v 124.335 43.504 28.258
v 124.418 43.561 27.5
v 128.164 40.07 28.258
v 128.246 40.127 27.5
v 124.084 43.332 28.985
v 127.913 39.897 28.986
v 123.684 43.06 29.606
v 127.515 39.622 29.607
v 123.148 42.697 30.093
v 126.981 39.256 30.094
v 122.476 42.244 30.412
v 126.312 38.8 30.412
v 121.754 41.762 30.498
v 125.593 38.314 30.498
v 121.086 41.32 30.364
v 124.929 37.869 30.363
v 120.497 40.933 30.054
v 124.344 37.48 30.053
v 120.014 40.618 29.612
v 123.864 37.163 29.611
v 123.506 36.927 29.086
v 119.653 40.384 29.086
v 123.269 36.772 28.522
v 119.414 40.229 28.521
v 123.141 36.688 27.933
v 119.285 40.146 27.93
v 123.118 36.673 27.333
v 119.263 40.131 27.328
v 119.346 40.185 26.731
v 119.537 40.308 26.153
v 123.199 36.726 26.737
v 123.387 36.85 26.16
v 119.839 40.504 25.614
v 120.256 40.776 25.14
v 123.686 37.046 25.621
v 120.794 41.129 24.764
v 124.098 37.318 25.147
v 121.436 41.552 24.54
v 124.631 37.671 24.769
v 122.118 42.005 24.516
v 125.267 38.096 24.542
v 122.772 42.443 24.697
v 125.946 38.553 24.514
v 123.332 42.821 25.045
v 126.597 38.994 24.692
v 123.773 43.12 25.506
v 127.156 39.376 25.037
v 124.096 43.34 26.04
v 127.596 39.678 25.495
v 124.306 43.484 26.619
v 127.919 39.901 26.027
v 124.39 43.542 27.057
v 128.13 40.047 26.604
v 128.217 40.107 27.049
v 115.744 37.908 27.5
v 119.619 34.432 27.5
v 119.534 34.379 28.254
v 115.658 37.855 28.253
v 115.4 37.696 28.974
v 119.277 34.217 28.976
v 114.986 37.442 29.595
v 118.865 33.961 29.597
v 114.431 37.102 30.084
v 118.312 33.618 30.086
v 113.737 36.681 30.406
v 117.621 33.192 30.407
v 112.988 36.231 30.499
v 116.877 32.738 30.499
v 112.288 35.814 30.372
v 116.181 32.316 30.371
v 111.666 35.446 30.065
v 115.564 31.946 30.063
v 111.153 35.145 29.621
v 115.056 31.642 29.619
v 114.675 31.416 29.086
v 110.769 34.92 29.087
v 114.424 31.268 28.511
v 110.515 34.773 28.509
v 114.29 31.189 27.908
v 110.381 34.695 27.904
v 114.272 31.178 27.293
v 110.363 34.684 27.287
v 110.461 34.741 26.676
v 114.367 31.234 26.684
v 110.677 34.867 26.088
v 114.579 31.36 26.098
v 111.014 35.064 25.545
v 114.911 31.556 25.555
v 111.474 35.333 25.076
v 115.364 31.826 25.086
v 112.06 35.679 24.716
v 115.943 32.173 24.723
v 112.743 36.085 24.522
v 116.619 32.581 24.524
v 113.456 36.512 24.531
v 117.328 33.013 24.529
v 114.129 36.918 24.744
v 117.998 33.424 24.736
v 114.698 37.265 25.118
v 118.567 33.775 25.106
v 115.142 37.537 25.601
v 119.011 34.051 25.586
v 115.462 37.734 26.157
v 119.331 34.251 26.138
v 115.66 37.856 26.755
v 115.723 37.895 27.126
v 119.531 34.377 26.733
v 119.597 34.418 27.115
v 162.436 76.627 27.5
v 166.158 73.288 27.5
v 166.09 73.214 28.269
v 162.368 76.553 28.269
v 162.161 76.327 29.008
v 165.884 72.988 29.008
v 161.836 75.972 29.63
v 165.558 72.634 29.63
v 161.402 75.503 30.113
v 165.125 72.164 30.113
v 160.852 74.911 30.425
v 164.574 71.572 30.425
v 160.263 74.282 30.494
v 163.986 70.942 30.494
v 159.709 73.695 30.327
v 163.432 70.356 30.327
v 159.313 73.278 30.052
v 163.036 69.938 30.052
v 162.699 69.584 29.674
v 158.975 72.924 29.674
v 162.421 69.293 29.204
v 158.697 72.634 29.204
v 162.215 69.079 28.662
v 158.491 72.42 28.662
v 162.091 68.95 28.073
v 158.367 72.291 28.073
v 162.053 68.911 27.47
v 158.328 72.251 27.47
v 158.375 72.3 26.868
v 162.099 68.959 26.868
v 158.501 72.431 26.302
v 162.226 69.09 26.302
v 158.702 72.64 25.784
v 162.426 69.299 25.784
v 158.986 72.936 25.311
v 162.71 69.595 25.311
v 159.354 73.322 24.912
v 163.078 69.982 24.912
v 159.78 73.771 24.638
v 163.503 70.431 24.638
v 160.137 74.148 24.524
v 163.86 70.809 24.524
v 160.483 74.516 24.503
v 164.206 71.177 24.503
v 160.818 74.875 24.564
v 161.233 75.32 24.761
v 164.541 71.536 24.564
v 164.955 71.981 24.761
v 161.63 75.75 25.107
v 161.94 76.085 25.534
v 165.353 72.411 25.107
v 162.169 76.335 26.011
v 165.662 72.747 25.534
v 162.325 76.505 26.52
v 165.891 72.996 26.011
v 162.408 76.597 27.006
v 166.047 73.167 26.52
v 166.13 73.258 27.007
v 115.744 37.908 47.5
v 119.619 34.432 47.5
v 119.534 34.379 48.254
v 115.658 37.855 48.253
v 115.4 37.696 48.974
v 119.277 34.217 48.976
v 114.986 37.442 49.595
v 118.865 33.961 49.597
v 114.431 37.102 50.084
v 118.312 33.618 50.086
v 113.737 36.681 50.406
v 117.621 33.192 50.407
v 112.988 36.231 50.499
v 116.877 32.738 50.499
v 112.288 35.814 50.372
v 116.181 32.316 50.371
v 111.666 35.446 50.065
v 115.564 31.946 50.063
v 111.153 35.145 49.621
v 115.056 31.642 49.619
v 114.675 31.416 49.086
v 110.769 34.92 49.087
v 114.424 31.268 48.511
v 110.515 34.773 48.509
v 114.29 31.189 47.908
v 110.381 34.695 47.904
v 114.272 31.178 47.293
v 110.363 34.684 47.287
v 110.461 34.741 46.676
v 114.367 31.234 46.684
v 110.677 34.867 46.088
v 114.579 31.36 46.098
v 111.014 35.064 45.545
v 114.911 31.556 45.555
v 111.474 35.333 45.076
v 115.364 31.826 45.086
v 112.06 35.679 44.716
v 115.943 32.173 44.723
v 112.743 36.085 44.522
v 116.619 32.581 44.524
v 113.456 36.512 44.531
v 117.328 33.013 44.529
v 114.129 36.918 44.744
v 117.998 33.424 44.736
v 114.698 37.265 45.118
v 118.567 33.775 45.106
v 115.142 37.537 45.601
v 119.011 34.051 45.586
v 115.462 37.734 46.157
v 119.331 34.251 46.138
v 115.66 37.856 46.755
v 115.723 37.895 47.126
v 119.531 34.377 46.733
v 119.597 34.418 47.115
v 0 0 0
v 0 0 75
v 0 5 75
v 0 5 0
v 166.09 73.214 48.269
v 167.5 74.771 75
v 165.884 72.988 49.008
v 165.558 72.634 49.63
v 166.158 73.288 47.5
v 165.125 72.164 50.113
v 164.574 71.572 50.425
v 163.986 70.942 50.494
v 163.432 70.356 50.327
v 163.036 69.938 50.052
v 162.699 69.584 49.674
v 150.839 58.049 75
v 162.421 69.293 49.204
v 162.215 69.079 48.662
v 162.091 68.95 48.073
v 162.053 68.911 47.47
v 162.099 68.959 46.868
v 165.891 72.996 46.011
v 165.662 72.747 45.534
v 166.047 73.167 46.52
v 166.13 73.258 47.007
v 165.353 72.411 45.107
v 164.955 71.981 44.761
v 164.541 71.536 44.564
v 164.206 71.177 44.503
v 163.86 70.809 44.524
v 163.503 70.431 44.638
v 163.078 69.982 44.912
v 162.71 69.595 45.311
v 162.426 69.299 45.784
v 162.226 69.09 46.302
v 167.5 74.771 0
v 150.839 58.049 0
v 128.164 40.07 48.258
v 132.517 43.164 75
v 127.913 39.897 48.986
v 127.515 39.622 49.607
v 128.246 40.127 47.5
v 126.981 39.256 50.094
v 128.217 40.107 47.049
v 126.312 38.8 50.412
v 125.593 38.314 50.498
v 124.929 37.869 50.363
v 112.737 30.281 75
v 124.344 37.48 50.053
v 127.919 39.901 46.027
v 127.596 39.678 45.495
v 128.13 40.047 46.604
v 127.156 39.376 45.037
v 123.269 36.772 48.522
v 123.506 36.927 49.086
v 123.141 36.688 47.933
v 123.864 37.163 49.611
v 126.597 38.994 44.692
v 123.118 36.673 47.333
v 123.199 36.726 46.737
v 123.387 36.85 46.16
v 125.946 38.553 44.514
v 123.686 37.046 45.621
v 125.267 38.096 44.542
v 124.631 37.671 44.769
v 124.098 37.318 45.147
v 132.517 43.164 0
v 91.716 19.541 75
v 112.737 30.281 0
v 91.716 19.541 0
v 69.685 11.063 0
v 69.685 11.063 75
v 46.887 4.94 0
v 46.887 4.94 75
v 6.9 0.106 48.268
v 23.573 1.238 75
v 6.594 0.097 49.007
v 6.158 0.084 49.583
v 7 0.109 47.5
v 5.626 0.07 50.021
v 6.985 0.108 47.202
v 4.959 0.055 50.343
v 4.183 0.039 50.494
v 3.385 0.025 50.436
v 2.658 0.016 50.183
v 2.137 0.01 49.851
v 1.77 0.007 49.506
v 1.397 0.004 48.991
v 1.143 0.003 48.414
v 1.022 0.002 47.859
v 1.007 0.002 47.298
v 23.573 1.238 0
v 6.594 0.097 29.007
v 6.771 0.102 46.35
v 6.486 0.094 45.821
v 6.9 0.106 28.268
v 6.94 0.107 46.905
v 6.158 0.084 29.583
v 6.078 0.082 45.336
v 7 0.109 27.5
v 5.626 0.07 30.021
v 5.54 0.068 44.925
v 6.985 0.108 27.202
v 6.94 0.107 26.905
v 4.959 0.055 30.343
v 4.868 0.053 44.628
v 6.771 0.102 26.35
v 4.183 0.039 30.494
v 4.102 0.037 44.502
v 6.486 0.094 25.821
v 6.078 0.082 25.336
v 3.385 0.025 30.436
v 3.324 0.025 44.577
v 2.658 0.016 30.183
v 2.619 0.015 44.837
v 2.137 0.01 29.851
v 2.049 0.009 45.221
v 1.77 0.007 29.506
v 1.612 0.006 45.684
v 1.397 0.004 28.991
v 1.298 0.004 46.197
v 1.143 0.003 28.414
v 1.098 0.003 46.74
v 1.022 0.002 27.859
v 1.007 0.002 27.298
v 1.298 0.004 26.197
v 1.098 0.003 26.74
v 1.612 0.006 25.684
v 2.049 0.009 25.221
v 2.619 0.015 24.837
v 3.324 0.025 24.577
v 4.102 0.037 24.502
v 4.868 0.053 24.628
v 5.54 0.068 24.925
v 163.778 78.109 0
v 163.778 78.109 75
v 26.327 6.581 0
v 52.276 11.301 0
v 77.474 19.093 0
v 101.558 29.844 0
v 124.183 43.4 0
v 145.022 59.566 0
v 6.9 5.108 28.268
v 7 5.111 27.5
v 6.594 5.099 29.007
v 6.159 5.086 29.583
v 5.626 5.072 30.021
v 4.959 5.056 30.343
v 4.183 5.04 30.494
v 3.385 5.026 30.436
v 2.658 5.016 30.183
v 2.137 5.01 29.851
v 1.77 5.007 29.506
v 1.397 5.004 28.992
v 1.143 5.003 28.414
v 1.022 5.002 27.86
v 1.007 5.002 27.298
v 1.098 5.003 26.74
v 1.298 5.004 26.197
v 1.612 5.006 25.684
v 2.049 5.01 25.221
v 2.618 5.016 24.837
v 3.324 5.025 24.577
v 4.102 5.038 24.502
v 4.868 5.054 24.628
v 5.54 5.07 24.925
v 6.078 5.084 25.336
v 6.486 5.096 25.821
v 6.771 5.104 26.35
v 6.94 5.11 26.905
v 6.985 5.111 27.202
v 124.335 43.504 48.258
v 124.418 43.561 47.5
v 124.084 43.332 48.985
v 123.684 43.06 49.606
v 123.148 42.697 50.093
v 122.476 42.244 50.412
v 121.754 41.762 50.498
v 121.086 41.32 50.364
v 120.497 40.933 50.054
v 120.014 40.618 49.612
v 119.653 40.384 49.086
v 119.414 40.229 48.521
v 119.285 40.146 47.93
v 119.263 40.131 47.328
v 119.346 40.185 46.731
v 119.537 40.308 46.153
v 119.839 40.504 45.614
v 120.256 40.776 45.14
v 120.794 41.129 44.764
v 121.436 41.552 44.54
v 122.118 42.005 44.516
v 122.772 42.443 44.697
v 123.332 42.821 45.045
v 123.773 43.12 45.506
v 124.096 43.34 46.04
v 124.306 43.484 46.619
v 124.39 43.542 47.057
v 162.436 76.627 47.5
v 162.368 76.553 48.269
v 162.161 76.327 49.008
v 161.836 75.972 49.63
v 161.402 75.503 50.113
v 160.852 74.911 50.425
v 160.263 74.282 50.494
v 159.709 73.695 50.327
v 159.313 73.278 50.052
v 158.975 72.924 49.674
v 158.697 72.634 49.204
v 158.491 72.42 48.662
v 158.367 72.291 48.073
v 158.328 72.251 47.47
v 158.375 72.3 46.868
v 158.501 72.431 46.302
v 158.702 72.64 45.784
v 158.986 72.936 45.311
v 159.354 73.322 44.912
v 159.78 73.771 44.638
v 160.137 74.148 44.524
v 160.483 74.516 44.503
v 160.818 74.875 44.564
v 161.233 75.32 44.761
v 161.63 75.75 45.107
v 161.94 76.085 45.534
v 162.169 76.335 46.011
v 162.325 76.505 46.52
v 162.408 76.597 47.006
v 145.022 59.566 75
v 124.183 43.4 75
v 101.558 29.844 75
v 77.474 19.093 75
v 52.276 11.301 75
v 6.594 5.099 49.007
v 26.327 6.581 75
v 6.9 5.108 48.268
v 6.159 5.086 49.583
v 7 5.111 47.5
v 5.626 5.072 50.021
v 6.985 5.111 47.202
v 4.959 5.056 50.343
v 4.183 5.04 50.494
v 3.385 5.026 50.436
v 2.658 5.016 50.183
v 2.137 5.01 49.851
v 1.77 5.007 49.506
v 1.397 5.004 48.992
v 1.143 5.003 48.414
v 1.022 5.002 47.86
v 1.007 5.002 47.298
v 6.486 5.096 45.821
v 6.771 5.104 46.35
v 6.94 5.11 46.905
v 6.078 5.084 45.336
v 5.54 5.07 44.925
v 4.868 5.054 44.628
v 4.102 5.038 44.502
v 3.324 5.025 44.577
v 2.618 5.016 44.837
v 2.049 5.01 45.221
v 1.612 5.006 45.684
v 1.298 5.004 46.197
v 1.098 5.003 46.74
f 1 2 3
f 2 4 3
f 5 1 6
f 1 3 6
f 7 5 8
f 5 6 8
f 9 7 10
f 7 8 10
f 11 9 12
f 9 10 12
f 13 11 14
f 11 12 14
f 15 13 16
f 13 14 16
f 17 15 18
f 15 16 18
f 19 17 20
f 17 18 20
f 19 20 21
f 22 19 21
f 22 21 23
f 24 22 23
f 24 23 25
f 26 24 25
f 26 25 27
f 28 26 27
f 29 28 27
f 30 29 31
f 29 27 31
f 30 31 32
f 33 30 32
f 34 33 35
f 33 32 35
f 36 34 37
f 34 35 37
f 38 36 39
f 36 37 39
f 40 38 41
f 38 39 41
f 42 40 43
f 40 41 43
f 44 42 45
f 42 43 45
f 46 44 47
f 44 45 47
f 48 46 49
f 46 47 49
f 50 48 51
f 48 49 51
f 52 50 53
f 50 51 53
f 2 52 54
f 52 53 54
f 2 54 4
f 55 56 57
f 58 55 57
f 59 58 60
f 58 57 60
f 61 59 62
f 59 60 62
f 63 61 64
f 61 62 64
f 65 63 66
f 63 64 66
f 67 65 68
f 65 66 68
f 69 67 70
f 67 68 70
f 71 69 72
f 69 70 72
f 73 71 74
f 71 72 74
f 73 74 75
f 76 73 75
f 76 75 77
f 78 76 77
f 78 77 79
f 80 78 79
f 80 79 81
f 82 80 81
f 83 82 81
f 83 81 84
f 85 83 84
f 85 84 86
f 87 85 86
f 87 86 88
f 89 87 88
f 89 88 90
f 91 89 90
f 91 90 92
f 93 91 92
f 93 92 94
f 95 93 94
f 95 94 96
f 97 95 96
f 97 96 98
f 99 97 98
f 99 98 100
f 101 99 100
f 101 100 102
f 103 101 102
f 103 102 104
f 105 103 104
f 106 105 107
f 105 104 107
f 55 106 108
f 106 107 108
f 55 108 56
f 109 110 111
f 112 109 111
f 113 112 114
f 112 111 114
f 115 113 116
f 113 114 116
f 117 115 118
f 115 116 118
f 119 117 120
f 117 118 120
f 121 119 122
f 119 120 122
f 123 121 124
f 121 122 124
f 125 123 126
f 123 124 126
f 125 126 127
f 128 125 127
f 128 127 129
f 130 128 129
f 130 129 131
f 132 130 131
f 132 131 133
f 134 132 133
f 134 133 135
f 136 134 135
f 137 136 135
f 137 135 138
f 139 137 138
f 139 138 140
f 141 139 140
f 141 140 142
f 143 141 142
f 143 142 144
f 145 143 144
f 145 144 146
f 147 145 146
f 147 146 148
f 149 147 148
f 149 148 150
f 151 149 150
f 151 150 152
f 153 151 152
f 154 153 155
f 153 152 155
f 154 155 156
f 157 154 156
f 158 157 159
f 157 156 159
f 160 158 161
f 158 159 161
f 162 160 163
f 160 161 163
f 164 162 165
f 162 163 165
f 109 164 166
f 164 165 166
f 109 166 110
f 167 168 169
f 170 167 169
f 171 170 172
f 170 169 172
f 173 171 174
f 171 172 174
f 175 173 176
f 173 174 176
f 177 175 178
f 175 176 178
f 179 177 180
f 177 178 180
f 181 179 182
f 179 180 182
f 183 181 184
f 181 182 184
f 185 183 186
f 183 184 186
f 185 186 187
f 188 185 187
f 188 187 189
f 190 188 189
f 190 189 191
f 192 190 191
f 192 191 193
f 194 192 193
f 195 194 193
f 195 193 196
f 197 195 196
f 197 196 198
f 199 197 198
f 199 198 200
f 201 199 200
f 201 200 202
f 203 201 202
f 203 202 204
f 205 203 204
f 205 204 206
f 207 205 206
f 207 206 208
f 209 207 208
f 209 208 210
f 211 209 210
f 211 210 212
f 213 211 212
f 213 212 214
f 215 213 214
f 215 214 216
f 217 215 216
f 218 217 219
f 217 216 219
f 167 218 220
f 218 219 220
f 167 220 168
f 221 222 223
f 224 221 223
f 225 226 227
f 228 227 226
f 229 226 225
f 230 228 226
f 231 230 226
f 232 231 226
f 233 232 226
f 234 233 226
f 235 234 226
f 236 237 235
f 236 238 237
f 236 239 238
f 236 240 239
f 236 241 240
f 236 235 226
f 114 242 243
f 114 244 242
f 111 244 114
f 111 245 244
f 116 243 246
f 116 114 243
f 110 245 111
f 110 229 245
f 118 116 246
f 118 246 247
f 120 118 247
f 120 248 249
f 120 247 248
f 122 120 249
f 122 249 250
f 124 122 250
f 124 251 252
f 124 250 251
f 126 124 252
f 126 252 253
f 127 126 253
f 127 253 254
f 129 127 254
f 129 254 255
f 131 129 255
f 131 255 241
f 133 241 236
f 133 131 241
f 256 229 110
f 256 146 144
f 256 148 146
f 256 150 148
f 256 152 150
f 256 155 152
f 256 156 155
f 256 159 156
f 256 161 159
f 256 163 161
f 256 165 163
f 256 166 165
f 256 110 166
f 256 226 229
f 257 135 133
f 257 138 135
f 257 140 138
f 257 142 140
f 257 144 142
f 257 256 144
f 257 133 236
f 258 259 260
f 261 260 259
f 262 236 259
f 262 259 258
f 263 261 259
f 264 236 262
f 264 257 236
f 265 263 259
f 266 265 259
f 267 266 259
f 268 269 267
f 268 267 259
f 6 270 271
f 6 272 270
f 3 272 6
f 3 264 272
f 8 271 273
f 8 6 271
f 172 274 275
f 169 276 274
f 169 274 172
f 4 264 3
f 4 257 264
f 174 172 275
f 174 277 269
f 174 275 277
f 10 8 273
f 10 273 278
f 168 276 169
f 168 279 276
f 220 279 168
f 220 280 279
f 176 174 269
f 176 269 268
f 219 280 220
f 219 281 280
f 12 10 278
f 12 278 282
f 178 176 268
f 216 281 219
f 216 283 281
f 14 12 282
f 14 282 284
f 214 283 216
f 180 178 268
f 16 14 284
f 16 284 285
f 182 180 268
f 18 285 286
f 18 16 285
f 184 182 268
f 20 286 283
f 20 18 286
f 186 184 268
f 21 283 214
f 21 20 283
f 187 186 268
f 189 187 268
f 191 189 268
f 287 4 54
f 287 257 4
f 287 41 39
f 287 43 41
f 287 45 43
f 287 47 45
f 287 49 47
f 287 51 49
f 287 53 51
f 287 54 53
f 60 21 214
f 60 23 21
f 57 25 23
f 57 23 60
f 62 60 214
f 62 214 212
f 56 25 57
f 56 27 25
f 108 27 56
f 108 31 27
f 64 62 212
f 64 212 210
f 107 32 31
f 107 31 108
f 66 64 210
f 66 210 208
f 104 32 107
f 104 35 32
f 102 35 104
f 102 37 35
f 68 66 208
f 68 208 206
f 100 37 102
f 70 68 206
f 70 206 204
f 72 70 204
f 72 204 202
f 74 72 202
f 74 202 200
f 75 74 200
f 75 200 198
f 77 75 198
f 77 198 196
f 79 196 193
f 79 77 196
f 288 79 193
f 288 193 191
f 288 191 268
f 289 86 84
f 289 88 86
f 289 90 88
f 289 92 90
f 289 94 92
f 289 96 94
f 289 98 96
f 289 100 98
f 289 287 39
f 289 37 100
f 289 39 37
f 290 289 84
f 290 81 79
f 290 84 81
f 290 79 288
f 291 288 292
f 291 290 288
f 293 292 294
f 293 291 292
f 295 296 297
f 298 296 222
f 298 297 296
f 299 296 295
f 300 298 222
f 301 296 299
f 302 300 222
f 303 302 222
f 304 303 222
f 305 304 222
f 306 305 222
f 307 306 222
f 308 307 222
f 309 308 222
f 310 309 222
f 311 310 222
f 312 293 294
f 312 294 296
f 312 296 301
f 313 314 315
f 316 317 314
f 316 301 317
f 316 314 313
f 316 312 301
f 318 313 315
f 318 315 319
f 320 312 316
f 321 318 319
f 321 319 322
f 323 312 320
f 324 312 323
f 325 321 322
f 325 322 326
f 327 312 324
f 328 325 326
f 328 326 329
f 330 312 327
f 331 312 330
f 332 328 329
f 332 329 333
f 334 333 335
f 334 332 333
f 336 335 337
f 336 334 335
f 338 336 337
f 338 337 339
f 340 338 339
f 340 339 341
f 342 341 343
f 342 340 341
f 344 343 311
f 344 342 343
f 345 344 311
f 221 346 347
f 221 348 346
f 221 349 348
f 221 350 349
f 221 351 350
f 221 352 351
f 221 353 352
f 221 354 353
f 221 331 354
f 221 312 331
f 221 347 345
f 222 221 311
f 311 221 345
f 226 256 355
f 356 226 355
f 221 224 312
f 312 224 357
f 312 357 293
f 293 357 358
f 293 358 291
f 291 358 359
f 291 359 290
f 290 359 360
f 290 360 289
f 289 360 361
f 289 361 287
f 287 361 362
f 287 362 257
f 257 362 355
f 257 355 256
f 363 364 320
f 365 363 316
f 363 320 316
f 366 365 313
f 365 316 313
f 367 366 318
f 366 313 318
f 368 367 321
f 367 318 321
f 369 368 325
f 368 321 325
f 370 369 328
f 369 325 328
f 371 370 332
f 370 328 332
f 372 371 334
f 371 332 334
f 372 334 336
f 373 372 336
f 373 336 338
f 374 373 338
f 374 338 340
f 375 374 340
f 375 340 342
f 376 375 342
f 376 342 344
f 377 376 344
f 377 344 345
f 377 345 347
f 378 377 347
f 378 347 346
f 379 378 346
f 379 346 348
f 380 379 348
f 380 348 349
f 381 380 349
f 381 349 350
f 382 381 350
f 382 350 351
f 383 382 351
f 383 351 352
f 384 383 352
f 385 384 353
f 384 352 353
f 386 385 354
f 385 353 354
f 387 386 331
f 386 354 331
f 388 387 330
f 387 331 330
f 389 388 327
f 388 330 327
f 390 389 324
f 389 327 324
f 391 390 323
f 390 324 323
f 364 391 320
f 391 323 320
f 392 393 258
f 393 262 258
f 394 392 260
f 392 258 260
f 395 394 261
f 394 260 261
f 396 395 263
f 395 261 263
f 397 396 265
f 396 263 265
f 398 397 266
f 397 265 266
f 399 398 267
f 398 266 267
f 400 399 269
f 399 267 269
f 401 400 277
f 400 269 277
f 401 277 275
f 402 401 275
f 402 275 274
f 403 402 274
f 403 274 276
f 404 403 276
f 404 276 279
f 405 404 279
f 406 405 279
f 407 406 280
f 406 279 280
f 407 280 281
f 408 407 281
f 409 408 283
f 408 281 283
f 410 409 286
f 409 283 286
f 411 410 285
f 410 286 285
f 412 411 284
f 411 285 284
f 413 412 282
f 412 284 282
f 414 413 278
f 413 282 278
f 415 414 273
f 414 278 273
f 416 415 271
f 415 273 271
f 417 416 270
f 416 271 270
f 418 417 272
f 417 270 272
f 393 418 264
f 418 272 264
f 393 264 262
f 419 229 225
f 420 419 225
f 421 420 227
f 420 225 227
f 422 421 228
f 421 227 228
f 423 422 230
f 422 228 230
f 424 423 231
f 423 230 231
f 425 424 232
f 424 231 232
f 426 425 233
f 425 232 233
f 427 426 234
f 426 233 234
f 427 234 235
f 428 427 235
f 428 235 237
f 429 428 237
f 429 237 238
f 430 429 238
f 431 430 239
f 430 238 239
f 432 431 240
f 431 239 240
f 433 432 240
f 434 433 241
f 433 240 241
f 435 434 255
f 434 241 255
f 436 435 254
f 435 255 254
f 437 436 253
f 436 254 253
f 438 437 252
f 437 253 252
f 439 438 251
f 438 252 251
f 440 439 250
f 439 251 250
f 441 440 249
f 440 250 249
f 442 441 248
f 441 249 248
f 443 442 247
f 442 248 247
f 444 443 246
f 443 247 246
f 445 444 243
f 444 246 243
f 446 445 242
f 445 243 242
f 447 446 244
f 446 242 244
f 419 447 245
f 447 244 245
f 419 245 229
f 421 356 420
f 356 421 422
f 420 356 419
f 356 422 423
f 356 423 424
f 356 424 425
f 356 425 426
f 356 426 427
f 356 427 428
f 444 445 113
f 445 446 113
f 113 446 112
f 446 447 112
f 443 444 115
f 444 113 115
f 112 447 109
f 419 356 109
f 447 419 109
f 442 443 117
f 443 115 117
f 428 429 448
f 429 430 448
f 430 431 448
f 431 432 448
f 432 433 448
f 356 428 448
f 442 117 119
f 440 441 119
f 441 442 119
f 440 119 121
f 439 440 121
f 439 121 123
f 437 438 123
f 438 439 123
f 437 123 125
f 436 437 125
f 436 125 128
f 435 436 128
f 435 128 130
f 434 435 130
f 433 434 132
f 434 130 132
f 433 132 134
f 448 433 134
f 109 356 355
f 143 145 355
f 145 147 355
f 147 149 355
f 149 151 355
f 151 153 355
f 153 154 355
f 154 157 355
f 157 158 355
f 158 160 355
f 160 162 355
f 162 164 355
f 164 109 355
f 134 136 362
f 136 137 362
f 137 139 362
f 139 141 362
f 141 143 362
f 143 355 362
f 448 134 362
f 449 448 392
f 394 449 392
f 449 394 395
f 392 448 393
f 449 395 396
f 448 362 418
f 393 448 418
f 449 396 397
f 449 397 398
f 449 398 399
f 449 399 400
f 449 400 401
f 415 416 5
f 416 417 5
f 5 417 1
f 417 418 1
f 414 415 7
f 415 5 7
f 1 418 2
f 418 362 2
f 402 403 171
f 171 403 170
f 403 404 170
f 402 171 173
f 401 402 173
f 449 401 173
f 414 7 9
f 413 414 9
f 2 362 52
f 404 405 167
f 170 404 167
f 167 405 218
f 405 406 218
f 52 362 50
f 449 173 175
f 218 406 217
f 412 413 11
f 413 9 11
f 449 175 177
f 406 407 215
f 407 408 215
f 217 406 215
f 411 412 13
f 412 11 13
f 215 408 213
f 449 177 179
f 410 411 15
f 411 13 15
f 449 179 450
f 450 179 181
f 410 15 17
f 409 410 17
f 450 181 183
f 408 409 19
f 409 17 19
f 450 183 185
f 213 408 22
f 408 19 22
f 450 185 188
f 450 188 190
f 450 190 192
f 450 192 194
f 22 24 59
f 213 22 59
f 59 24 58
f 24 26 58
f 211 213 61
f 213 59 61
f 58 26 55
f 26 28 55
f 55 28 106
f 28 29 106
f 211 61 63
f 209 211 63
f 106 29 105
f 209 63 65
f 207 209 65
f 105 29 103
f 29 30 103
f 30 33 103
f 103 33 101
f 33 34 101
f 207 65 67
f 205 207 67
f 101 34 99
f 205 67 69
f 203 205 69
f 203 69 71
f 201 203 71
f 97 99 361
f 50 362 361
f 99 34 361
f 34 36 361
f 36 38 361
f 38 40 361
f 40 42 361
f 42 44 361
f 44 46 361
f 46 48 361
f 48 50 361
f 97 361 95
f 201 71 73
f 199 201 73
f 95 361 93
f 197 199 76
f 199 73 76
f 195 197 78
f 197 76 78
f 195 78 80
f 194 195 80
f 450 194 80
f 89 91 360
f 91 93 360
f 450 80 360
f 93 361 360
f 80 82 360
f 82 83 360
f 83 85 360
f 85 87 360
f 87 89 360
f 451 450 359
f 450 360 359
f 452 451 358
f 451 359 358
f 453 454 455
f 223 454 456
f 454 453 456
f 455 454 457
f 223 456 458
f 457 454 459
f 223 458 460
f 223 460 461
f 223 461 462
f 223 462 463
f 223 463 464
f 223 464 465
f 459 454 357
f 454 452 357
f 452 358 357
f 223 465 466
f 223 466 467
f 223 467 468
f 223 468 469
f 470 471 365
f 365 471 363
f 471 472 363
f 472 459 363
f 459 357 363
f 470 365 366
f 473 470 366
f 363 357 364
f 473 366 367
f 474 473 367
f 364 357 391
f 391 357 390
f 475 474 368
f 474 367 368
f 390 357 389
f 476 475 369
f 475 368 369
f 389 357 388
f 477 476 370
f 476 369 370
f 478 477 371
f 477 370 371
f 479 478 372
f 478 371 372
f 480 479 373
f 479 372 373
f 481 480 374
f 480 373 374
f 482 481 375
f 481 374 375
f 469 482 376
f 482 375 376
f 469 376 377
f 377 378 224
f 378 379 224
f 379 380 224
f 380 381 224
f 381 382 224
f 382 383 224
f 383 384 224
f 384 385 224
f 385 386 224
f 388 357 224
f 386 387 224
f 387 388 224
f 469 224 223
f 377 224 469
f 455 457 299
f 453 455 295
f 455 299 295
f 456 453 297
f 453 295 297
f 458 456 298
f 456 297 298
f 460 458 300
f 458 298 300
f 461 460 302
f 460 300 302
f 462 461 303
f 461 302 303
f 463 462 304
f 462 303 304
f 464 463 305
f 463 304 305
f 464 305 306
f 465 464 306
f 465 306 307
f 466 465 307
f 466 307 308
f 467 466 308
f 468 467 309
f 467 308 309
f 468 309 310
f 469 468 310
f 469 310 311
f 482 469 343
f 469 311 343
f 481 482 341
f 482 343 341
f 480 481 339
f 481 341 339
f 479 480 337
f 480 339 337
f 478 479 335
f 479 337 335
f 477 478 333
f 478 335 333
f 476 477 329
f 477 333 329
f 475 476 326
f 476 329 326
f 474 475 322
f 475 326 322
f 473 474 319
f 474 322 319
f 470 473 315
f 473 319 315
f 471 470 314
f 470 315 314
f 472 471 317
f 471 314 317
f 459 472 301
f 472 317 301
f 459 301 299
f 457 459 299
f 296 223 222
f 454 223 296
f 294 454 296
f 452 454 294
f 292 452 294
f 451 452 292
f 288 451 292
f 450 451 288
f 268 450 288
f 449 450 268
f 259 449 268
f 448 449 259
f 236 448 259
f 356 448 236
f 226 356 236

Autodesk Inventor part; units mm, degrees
ref_plane "YZ Plane" through (0, 0, 0) normal (1, 0, 0) x (0, 1, 0)
sketch "Sketch1" plane through (0, 0, 0) normal (0, 0, 1) x (1, 0, 0)
  circle A0 centre (0, 225) radius 225 construction
  circle A1 centre (0, 225) radius 220 construction
  line L0 (0, 0) -> (0, 5)
  arc A2 (0, 0) -> (167.5, 74.771) centre (0, 225) ccw
  line L1 (167.5, 74.771) -> (163.7778, 78.1094)
  arc A3 (0, 5) -> (163.7778, 78.1094) centre (0, 225) ccw
  dimension "d0" = 450
  dimension "d1" = 5
  dimension "d2" = 5
  dimension "d6" = 167.5
extrude "Extrusion1" add sketch "Sketch1" along normal blind 75
ref_plane "Work Plane2" through (0, 0, 0) normal (0, -1, 0) x (1, 0, 0)
sketch "Sketch3" plane through (0, 0, 0) normal (0, -1, 0) x (1, 0, 0)
  circle A0 centre (4, 47.5) radius 3
  circle A1 centre (4, 27.5) radius 3
  point P0 (0, 0)
  dimension "d15" = 6
  dimension "d16" = 6
  dimension "d17" = 27.5
  dimension "d18" = 20
  dimension "d19" = 4
extrude "Extrusion3" cut sketch "Sketch3" along normal through all both and the other way through all
ref_plane "Work Plane3" through (167.5, 74.771, 0) normal (0.7444, -0.6677, 0) x (0.6677, 0.7444, 0)
sketch "Sketch4" plane through (167.5, 74.771, 0) normal (0.7444, -0.6677, 0) x (0.6677, 0.7444, 0)
  circle A0 centre (-55, 47.5) radius 3
  circle A1 centre (-55, 27.5) radius 3
  line L0 (-167.5, 0) -> (0, 0) projected
  line L1 (0, 0) -> (0, 75) projected
  circle A2 centre (-5, 47.5) radius 3
  circle A3 centre (-5, 27.5) radius 3
  circle A4 centre (-65, 27.5) radius 3
  circle A5 centre (-65, 47.5) radius 3
  dimension "d22" = 6
  dimension "d23" = 6
  dimension "d24" = 27.5
  dimension "d25" = 20
  dimension "d26" = 55
  dimension "d29" = 6
  dimension "d30" = 6
  dimension "d31" = 5
  dimension "d32" = 6
  dimension "d33" = 6
  dimension "d34" = 10
extrude "Extrusion4" cut sketch "Sketch4" along normal through all both and the other way through all
properties part number "CW003" material "ABS Plastic"
